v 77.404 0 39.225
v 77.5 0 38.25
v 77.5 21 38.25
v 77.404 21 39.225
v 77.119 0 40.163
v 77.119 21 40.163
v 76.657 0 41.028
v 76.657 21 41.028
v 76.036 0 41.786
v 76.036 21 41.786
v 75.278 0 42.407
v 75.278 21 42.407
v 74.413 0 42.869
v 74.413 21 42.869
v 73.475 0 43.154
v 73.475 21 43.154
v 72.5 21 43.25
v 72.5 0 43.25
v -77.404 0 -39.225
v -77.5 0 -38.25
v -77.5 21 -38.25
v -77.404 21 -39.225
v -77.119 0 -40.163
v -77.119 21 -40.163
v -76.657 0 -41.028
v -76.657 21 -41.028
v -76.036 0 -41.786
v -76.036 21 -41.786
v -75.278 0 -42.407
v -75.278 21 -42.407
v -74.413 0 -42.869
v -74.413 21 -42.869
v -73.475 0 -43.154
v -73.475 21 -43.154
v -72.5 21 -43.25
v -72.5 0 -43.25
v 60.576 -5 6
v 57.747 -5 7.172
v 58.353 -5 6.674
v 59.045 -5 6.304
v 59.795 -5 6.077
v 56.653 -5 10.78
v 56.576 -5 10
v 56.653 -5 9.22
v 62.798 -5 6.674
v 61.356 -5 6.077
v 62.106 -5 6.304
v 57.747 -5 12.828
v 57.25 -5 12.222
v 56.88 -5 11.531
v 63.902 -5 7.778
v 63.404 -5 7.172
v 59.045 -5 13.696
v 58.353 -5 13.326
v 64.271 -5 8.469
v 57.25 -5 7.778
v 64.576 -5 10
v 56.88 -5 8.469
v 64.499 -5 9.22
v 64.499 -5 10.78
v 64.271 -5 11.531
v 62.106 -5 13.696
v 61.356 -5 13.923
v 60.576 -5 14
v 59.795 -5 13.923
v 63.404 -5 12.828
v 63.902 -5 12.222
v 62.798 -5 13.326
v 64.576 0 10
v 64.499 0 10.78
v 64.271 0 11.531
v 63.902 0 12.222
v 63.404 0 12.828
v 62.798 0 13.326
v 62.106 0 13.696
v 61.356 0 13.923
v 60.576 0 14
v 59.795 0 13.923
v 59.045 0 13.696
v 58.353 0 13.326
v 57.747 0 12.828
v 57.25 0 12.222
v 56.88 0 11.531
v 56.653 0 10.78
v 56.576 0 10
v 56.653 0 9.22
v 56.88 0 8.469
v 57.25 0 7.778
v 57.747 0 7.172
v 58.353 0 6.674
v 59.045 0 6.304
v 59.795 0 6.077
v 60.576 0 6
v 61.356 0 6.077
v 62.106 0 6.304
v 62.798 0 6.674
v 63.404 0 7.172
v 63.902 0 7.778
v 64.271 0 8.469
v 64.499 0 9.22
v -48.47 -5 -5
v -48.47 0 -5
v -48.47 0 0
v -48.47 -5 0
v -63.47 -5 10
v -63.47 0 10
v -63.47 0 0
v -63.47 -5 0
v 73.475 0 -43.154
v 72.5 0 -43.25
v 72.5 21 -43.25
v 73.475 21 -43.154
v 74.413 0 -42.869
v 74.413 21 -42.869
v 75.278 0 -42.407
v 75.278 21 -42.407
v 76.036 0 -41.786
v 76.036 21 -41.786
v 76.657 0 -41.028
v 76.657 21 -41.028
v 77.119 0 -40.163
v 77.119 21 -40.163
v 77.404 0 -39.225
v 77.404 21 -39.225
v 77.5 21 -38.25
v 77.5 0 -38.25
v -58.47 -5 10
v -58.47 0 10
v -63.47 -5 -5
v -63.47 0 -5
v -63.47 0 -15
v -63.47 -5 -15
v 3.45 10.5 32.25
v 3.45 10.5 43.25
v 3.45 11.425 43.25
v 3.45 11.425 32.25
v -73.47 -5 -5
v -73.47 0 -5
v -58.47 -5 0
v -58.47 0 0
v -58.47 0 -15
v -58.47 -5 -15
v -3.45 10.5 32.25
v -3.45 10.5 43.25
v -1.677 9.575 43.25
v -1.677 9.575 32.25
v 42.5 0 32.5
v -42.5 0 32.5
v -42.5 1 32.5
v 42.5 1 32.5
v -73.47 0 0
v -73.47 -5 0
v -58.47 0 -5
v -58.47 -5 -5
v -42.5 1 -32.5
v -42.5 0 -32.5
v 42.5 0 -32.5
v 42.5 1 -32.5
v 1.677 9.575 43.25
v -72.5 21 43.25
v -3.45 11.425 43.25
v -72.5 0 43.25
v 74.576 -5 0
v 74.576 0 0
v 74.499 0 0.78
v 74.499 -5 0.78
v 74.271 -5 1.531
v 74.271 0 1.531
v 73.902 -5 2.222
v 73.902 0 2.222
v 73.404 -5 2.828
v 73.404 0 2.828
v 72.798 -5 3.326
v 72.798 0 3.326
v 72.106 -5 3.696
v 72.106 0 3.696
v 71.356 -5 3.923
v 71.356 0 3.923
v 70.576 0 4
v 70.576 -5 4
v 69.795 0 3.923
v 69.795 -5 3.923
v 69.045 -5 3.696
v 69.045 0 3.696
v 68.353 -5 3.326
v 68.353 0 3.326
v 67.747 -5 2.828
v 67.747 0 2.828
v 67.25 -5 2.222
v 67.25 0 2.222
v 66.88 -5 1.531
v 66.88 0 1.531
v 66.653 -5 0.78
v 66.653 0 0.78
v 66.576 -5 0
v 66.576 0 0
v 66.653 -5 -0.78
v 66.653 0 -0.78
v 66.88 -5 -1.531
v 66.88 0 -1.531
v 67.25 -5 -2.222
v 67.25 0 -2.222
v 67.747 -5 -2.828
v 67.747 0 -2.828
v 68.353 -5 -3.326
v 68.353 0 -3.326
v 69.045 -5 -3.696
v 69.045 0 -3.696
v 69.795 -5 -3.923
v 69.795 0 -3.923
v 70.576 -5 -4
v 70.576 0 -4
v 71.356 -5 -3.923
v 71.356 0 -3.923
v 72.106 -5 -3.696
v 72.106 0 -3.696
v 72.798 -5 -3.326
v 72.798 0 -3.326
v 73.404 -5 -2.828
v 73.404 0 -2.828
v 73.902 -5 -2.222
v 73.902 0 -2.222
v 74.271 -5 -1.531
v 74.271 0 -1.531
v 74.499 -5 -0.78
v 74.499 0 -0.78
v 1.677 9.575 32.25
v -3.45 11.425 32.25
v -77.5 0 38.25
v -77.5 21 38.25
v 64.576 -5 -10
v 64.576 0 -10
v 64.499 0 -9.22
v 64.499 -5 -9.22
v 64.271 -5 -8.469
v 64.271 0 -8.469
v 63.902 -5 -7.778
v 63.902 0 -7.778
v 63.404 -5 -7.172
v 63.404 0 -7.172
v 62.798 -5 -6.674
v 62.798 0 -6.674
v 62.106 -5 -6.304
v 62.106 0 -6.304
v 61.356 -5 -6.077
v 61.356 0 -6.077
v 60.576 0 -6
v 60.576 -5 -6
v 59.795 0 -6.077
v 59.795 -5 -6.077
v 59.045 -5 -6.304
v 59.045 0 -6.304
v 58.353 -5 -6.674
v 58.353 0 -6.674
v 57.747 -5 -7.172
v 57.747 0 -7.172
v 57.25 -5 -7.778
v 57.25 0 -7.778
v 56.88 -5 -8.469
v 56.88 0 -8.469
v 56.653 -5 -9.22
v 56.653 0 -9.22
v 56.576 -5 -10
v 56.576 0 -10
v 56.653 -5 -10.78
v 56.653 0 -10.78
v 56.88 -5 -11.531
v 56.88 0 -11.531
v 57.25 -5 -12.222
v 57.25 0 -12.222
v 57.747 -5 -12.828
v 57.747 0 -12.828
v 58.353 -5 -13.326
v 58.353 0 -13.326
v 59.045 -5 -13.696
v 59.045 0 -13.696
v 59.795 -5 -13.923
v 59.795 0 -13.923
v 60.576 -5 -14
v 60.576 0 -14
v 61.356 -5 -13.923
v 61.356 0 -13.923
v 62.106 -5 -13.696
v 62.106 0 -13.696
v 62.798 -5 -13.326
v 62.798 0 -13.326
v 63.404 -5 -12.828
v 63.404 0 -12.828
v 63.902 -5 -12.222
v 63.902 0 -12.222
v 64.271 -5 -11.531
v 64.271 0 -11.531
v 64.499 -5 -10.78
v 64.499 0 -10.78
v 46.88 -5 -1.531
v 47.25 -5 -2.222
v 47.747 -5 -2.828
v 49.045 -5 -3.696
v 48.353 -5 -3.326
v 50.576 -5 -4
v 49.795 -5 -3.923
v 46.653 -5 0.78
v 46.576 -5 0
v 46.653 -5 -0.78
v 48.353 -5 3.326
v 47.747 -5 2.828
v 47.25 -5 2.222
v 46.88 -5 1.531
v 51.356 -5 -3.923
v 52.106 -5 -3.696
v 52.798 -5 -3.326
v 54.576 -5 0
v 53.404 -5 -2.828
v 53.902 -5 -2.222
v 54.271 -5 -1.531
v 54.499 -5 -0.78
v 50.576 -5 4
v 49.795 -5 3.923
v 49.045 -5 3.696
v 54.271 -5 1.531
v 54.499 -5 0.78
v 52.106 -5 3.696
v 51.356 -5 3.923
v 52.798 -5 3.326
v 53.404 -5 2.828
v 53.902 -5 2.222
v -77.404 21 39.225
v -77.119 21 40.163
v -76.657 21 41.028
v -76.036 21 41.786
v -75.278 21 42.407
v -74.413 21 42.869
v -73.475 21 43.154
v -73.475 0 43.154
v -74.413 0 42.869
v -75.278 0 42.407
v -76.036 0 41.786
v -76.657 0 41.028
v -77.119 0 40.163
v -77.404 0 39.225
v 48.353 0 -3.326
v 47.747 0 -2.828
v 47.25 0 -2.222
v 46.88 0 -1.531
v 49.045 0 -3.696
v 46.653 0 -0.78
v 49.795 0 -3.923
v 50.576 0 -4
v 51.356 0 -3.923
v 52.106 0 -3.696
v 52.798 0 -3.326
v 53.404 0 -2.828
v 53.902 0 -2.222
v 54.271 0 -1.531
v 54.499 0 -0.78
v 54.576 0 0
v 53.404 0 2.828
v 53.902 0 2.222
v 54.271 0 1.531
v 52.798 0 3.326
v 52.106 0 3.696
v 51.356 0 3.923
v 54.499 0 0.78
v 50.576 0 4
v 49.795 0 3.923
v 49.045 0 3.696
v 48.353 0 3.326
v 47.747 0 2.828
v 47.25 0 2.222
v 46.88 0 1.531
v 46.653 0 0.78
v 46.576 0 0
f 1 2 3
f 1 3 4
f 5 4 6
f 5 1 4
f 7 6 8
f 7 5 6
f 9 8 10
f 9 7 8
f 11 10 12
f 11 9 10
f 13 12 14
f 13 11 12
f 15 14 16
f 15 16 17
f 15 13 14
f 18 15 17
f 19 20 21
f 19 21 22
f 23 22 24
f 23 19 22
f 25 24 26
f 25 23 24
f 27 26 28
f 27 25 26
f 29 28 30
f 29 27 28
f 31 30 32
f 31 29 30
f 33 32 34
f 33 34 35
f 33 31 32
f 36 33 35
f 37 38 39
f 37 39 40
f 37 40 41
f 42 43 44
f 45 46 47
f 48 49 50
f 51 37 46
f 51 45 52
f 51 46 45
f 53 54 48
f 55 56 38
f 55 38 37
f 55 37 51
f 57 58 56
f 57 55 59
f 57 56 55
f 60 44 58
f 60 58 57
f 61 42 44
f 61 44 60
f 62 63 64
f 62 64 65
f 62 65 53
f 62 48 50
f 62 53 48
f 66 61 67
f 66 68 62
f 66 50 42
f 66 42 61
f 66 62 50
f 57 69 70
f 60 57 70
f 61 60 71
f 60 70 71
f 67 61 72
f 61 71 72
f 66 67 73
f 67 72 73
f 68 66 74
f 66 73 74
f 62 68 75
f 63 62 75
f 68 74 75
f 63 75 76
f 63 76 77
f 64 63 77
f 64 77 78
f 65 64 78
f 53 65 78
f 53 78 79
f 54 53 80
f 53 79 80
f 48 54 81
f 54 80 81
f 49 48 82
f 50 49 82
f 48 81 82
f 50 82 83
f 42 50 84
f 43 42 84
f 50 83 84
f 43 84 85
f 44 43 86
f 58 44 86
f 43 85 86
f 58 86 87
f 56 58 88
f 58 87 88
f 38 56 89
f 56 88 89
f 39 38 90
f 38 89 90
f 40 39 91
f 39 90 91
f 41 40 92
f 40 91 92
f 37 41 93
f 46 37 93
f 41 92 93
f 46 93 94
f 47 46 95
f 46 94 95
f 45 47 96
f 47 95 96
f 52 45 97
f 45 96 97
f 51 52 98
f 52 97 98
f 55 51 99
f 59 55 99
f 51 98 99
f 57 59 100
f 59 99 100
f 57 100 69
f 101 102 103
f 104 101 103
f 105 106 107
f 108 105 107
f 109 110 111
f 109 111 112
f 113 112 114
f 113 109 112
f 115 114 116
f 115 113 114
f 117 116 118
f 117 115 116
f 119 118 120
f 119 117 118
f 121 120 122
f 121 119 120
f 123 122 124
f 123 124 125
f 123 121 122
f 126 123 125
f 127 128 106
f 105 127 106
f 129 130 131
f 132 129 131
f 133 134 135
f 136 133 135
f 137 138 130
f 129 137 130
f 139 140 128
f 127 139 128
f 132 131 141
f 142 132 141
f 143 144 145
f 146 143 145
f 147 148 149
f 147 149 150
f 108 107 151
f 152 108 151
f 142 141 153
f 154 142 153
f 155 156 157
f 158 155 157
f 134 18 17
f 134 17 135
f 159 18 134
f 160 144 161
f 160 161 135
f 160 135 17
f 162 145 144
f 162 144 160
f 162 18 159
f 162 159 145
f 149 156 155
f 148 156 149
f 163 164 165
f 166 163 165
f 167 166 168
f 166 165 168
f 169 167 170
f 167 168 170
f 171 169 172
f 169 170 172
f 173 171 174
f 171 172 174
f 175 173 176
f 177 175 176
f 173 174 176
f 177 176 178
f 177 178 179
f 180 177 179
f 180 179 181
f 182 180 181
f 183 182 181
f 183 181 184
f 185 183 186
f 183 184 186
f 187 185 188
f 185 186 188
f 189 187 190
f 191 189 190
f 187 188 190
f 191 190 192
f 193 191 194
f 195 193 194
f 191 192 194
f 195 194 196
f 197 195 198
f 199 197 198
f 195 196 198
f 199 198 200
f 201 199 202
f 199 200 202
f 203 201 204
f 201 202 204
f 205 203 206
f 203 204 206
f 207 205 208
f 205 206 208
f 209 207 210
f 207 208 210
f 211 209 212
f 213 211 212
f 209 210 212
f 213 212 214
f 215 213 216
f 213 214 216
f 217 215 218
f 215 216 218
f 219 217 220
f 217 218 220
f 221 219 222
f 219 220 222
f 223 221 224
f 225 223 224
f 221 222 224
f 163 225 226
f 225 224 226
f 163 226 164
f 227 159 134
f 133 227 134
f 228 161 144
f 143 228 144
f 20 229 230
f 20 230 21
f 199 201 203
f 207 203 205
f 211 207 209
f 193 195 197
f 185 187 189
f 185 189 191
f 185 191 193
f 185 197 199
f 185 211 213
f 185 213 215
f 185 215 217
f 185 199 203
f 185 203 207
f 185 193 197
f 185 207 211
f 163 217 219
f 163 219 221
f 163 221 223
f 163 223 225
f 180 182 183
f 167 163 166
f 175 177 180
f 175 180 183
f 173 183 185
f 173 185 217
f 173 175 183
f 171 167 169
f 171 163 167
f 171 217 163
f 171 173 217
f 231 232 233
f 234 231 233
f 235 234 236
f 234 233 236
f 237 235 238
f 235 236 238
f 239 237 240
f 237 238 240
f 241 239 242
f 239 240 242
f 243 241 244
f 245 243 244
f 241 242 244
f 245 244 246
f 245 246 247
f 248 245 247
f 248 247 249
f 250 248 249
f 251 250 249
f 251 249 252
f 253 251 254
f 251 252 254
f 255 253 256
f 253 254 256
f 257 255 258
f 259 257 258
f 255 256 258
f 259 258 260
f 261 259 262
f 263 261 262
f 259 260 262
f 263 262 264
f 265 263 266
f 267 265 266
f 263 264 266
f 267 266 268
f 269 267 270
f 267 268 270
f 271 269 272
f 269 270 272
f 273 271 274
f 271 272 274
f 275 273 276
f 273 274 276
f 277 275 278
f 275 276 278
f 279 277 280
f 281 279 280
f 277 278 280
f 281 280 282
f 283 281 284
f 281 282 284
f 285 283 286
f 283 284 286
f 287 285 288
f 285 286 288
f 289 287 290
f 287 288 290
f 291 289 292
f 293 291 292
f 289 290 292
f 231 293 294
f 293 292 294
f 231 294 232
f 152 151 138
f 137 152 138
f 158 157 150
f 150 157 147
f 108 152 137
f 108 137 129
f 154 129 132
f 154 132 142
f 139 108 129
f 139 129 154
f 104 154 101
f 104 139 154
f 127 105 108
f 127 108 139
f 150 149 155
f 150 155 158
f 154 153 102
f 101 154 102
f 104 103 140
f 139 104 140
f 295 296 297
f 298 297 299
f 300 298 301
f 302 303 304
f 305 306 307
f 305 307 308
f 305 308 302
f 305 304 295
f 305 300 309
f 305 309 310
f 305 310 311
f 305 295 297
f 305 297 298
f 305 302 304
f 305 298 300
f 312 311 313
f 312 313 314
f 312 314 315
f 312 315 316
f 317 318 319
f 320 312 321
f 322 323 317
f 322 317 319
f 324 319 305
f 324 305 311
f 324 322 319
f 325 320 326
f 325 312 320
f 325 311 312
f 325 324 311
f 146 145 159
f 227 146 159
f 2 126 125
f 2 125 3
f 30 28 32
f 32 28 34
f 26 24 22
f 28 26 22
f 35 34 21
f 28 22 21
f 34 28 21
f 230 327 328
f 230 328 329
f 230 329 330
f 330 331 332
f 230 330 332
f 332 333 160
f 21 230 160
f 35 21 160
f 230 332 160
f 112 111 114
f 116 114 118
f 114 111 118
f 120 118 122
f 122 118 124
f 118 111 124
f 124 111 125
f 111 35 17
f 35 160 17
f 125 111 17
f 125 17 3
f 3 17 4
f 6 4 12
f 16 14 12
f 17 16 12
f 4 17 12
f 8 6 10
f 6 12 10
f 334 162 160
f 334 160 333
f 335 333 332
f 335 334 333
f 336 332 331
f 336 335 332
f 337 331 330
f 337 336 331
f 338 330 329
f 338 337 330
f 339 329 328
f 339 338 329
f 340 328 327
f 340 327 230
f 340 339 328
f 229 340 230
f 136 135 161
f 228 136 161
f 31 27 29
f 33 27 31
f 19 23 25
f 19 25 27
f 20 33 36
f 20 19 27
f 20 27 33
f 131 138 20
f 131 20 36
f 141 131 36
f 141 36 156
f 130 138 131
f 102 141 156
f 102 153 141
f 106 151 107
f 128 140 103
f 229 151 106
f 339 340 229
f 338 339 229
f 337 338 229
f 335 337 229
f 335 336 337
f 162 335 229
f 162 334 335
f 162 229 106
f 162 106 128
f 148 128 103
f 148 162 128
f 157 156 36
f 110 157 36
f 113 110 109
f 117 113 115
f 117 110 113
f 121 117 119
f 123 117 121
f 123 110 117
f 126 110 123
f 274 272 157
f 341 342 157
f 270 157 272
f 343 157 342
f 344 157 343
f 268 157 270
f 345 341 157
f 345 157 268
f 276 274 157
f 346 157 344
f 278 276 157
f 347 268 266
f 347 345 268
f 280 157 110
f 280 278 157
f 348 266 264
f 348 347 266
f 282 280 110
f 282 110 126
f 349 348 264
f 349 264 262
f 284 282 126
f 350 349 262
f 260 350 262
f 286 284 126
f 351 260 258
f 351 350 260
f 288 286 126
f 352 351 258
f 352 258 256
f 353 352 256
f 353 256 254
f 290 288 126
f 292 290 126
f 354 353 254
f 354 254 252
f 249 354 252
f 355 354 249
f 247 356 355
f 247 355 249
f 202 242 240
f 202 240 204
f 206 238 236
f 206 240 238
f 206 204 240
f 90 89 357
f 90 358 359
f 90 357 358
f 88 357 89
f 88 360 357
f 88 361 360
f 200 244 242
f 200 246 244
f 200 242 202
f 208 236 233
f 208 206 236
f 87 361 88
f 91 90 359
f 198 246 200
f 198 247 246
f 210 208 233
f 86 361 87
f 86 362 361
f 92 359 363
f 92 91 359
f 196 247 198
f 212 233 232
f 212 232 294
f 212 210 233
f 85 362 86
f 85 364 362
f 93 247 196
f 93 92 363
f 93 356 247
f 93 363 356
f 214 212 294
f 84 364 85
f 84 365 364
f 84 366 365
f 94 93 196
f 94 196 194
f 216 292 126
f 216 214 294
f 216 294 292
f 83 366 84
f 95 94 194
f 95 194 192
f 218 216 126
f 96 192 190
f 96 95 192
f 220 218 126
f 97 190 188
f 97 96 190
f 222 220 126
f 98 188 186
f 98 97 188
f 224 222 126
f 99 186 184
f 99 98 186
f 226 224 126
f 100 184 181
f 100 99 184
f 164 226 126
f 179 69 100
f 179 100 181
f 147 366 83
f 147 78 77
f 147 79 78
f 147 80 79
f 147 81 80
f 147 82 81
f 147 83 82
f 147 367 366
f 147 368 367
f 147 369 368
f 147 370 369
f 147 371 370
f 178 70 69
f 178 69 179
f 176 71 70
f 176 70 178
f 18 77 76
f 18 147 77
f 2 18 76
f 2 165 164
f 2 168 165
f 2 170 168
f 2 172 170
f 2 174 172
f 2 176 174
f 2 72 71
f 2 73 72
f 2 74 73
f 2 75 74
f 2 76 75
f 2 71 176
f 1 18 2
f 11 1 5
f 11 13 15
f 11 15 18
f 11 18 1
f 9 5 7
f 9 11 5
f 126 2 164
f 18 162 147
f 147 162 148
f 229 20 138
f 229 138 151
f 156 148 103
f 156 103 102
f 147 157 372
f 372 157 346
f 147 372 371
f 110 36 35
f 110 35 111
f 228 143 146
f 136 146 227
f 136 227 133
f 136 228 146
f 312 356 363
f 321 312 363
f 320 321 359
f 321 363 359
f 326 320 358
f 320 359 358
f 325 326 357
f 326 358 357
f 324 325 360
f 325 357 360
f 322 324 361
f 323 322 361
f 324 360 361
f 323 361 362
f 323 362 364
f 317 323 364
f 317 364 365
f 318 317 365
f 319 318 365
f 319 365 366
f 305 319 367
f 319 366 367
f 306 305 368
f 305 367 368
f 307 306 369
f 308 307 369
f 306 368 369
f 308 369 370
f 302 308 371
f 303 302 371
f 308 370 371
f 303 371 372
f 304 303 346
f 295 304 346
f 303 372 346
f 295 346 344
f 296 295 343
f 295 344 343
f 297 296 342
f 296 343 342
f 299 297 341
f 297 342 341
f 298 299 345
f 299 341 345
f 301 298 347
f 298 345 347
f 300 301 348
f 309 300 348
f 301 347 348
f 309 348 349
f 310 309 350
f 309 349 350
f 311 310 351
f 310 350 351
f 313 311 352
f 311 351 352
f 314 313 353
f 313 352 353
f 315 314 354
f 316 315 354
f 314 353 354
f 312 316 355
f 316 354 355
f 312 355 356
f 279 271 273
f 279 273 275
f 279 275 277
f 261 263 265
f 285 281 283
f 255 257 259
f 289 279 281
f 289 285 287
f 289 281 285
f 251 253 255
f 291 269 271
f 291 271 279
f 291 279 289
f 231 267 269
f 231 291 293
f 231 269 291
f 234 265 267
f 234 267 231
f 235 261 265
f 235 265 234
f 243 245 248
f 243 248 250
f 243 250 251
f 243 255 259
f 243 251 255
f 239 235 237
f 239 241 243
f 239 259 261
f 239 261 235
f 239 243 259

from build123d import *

# Parameters (mm, degrees)
F1_DEPTH = 21
F4_DEPTH = 5
F5_R     = 4
F6_DEPTH = 5
F2_W     = 85
F2_H     = 65
F7_DEPTH = 1
F9_DEPTH = 11


with BuildPart() as f1:
    # F0 (on Front) → F1 (new body)
    with BuildSketch(Plane.XZ):
        with BuildLine():
            Line((-72.5, -43.25), (72.5, -43.25))
            ThreePointArc((72.5, -43.25), (76.035534, -41.785534), (77.5, -38.25))
            Line((77.5, -38.25), (77.5, 38.25))
            ThreePointArc((77.5, 38.25), (76.035534, 41.785534), (72.5, 43.25))
            Line((72.5, 43.25), (-72.5, 43.25))
            ThreePointArc((-72.5, 43.25), (-76.035534, 41.785534), (-77.5, 38.25))
            Line((-77.5, 38.25), (-77.5, -38.25))
            ThreePointArc((-77.5, -38.25), (-76.035534, -41.785534), (-72.5, -43.25))
        make_face()
    extrude(amount=-F1_DEPTH)

    # F3 (on face) → F4 (join)
    with BuildSketch(Plane.XZ):
        Polygon((-48.470394, -5), (-48.470394, 0), (-58.470394, 0), (-58.470394, 10), (-63.470394, 10), (-63.470394, 0), (-73.470394, 0), (-73.470394, -5), (-63.470394, -5), (-63.470394, -15), (-58.470394, -15), (-58.470394, -5), align=None)
    extrude(amount=F4_DEPTH)

    # F5 (on Front) → F6 (join)
    with BuildSketch(Plane.XZ):
        with Locations((60.575662, 10)):
            Circle(F5_R)
        with Locations((70.575662, 0)):
            Circle(F5_R)
        with Locations((60.575662, -10)):
            Circle(F5_R)
        with Locations((50.575662, 0)):
            Circle(F5_R)
    extrude(amount=F6_DEPTH)

    # F2 (on face) → F7 (cut)
    with BuildSketch(Plane.XZ):
        Rectangle(F2_W, F2_H)
    extrude(amount=-F7_DEPTH, mode=Mode.SUBTRACT)

    # F8 (on face) → F9 (cut)
    with BuildSketch(Plane.XY.offset(43.25)):
        Polygon((-1.676761, 9.575), (1.676761, 9.575), (3.45, 10.5), (3.45, 11.425), (-3.45, 11.425), (-3.45, 10.5), align=None)
    extrude(amount=-F9_DEPTH, mode=Mode.SUBTRACT)


solid = f1.part
